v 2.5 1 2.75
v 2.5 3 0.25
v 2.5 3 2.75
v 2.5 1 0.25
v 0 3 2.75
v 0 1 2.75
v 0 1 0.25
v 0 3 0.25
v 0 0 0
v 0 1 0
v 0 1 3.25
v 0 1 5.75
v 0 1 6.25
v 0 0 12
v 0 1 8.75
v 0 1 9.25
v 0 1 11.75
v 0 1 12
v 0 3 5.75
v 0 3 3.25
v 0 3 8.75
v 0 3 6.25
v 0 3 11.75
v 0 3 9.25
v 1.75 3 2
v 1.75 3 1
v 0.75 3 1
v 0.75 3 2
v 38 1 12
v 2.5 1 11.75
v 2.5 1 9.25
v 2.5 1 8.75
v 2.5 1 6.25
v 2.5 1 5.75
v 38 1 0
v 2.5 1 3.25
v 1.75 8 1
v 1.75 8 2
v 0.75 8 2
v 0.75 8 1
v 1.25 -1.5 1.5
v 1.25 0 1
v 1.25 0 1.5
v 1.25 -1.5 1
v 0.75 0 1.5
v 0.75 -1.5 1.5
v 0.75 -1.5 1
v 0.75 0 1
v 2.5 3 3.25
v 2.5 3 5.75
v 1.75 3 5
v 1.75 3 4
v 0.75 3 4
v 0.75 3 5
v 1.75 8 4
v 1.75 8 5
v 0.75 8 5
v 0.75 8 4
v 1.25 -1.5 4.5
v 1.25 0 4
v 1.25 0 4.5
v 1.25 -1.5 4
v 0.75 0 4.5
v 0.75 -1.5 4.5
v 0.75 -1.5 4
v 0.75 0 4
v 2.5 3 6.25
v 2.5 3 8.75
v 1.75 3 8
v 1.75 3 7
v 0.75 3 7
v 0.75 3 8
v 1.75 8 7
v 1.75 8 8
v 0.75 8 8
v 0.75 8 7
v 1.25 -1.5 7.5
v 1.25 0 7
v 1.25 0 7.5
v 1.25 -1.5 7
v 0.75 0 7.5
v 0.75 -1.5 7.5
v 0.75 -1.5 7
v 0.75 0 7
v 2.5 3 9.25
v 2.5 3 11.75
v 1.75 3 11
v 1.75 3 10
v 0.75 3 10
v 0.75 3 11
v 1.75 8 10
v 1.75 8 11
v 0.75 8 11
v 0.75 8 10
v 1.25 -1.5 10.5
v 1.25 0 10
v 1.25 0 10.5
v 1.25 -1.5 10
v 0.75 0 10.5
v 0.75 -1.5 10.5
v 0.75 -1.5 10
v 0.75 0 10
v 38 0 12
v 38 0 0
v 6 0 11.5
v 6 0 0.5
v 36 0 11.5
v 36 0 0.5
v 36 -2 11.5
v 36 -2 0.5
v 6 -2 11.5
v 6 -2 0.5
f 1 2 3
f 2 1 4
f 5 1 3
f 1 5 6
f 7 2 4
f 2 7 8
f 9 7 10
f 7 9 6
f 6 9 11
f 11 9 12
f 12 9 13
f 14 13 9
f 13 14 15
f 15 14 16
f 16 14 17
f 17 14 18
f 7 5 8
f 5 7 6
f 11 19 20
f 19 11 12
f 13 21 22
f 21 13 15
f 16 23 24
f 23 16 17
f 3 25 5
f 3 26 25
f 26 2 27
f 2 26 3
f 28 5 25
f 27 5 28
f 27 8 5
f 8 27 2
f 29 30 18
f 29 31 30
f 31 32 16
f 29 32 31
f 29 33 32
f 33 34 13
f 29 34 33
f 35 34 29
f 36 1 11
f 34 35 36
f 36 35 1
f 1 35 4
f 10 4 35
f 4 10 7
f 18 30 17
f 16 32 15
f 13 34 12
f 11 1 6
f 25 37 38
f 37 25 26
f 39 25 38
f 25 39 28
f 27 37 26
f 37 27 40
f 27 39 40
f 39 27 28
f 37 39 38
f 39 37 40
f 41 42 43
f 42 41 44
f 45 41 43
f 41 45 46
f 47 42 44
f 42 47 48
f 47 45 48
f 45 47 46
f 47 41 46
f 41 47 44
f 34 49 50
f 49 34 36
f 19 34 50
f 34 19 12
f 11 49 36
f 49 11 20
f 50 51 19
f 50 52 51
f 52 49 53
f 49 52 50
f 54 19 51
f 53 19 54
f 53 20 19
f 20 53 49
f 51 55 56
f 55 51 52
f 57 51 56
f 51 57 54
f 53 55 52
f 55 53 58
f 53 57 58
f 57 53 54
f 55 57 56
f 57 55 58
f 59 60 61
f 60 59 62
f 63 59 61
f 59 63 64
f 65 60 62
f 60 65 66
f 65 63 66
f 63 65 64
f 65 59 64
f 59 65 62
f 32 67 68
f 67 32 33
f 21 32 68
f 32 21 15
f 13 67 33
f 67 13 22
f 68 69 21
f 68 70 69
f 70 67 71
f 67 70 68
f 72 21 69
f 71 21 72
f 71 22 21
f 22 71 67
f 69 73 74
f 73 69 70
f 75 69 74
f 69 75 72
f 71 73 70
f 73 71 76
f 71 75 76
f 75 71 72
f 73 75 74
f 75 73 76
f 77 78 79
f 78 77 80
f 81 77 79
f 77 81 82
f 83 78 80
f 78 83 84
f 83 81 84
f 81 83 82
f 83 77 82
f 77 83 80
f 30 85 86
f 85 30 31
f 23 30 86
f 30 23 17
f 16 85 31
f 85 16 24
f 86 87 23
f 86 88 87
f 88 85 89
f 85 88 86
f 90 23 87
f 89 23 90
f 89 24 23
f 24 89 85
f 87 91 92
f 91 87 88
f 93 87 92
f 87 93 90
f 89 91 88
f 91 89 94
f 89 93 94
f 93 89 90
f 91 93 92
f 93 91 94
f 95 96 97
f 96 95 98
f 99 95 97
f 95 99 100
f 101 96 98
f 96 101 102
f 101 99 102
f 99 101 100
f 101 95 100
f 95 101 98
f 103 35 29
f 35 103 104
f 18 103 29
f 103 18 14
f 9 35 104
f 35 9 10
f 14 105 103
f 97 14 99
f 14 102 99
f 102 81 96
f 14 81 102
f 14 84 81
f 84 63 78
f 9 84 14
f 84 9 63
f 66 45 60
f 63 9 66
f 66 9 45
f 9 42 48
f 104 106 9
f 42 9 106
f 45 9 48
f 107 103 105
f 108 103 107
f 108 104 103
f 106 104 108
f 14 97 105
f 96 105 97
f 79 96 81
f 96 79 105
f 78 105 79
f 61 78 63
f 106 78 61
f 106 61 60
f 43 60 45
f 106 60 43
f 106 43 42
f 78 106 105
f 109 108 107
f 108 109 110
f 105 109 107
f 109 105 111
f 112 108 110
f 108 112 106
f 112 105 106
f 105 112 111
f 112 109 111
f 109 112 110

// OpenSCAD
module display() {
    
    // board
    color("green")
    cube([38,1,12]);

    // display
    color("#444444")
    translate([6, -2, .5])
    cube([30,2,11]);

    // pins
    translate([0,0,.25])
    for (i=[0:3]) {
        color("black")
        translate([0, 1, i*3])
        cube([2.5,2,2.5]);

        color("yellow")
        translate([.75, 2, .75 + (i*3)])
        cube([1,6,1]);

        color("#AAAAAA")
        translate([0.75, -1.5, 0.75 + (i*3)])
        cube([.5,2,.5]);
    }
}

display();
